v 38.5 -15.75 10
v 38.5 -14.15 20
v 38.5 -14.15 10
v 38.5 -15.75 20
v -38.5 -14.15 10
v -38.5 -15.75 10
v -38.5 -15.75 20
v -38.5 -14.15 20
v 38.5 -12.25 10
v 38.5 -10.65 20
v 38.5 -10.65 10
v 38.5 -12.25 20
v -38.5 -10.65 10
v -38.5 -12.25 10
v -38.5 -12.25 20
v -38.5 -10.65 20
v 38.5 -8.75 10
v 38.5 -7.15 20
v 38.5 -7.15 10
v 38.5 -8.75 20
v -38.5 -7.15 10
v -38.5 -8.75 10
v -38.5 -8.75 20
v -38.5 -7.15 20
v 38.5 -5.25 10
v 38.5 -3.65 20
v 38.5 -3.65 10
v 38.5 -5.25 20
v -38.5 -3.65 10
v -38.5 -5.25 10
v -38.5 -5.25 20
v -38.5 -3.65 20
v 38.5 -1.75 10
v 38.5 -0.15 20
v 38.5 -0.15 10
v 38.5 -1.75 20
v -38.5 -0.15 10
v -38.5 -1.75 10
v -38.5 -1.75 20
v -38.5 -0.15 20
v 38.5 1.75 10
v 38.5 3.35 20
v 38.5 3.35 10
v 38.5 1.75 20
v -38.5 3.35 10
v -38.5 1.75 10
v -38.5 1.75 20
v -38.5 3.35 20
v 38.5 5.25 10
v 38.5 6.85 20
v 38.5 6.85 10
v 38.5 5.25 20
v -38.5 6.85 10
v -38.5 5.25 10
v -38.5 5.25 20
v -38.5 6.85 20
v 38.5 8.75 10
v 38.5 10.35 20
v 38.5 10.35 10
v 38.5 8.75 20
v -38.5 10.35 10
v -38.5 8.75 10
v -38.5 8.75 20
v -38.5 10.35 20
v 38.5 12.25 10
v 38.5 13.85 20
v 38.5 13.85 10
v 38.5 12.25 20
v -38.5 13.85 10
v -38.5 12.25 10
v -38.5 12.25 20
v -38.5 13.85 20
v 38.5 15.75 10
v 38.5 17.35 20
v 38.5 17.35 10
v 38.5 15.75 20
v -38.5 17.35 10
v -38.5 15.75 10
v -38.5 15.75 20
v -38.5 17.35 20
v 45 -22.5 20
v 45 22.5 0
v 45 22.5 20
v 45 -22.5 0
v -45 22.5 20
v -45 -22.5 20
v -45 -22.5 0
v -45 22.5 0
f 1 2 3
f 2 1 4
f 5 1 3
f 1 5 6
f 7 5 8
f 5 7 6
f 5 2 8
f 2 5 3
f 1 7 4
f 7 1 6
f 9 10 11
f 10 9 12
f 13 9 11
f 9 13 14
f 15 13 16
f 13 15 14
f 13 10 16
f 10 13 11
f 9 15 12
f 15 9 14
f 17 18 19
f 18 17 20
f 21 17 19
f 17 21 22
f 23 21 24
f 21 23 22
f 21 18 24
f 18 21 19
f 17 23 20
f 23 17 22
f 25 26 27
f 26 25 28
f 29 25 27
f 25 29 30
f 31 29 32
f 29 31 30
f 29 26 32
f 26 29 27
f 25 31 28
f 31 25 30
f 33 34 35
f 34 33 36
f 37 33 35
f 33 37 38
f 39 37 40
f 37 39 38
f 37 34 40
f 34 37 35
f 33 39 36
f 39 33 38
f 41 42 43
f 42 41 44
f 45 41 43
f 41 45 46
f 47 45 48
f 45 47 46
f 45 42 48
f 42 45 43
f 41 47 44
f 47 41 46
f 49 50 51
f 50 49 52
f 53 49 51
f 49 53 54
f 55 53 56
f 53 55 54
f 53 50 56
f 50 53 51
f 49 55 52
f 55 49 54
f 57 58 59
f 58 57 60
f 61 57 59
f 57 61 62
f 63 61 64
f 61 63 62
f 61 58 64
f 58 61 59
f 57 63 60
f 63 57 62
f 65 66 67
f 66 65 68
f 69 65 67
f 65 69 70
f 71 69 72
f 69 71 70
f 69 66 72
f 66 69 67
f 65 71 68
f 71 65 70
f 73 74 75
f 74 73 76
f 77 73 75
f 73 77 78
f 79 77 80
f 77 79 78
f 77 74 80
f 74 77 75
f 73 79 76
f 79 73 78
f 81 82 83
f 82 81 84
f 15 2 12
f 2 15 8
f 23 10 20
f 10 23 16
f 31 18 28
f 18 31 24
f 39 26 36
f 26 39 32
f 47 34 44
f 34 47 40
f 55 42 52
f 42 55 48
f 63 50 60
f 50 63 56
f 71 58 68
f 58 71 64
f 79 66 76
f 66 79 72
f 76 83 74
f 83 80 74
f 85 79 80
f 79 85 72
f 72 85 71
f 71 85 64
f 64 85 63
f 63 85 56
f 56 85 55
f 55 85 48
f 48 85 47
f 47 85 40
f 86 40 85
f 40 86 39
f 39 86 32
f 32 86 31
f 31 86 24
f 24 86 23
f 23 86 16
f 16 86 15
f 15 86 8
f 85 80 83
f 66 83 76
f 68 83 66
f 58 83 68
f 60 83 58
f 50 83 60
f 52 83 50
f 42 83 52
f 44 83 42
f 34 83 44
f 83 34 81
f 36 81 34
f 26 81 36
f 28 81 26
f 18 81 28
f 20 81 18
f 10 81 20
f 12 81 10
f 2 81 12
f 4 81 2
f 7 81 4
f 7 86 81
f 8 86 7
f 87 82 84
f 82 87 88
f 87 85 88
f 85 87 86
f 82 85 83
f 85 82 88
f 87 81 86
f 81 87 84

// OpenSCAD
// Slide drying rack - holds 10 microscope slides standing upright on their long edge
// Print orientation: base block on the bed (z = 0), slots open at the top

// ---------------- Parameters ----------------
block_len    = 90;    // base block length along X (mm)
block_wid    = 45;    // base block width along Y (mm)
block_ht     = 20;    // base block height along Z (mm)

slot_count   = 10;    // number of slide slots
slot_len     = 77;    // slot length along X (mm)
slot_wid     = 1.6;   // slot width along Y (mm)
slot_depth   = 10;    // slot depth from top face (mm)
slot_pitch   = 3.5;   // centre-to-centre slot spacing along Y (mm)

eps          = 0.5;   // overshoot so cutters pass beyond the top face (mm)

$fn = 64;

// ---------------- Derived ----------------
// Transverse slot position (Y), centred on the block
function slot_y(i) = (i - (slot_count - 1) / 2) * slot_pitch;

// ---------------- Model ----------------
difference() {
    // Base block, centred in X and Y, sitting on z = 0
    translate([-block_len / 2, -block_wid / 2, 0])
        cube([block_len, block_wid, block_ht]);

    // Parallel slots running along X, open at the top
    for (i = [0 : slot_count - 1])
        translate([-slot_len / 2, slot_y(i), block_ht - slot_depth])
            cube([slot_len, slot_wid, slot_depth + eps]);
}
